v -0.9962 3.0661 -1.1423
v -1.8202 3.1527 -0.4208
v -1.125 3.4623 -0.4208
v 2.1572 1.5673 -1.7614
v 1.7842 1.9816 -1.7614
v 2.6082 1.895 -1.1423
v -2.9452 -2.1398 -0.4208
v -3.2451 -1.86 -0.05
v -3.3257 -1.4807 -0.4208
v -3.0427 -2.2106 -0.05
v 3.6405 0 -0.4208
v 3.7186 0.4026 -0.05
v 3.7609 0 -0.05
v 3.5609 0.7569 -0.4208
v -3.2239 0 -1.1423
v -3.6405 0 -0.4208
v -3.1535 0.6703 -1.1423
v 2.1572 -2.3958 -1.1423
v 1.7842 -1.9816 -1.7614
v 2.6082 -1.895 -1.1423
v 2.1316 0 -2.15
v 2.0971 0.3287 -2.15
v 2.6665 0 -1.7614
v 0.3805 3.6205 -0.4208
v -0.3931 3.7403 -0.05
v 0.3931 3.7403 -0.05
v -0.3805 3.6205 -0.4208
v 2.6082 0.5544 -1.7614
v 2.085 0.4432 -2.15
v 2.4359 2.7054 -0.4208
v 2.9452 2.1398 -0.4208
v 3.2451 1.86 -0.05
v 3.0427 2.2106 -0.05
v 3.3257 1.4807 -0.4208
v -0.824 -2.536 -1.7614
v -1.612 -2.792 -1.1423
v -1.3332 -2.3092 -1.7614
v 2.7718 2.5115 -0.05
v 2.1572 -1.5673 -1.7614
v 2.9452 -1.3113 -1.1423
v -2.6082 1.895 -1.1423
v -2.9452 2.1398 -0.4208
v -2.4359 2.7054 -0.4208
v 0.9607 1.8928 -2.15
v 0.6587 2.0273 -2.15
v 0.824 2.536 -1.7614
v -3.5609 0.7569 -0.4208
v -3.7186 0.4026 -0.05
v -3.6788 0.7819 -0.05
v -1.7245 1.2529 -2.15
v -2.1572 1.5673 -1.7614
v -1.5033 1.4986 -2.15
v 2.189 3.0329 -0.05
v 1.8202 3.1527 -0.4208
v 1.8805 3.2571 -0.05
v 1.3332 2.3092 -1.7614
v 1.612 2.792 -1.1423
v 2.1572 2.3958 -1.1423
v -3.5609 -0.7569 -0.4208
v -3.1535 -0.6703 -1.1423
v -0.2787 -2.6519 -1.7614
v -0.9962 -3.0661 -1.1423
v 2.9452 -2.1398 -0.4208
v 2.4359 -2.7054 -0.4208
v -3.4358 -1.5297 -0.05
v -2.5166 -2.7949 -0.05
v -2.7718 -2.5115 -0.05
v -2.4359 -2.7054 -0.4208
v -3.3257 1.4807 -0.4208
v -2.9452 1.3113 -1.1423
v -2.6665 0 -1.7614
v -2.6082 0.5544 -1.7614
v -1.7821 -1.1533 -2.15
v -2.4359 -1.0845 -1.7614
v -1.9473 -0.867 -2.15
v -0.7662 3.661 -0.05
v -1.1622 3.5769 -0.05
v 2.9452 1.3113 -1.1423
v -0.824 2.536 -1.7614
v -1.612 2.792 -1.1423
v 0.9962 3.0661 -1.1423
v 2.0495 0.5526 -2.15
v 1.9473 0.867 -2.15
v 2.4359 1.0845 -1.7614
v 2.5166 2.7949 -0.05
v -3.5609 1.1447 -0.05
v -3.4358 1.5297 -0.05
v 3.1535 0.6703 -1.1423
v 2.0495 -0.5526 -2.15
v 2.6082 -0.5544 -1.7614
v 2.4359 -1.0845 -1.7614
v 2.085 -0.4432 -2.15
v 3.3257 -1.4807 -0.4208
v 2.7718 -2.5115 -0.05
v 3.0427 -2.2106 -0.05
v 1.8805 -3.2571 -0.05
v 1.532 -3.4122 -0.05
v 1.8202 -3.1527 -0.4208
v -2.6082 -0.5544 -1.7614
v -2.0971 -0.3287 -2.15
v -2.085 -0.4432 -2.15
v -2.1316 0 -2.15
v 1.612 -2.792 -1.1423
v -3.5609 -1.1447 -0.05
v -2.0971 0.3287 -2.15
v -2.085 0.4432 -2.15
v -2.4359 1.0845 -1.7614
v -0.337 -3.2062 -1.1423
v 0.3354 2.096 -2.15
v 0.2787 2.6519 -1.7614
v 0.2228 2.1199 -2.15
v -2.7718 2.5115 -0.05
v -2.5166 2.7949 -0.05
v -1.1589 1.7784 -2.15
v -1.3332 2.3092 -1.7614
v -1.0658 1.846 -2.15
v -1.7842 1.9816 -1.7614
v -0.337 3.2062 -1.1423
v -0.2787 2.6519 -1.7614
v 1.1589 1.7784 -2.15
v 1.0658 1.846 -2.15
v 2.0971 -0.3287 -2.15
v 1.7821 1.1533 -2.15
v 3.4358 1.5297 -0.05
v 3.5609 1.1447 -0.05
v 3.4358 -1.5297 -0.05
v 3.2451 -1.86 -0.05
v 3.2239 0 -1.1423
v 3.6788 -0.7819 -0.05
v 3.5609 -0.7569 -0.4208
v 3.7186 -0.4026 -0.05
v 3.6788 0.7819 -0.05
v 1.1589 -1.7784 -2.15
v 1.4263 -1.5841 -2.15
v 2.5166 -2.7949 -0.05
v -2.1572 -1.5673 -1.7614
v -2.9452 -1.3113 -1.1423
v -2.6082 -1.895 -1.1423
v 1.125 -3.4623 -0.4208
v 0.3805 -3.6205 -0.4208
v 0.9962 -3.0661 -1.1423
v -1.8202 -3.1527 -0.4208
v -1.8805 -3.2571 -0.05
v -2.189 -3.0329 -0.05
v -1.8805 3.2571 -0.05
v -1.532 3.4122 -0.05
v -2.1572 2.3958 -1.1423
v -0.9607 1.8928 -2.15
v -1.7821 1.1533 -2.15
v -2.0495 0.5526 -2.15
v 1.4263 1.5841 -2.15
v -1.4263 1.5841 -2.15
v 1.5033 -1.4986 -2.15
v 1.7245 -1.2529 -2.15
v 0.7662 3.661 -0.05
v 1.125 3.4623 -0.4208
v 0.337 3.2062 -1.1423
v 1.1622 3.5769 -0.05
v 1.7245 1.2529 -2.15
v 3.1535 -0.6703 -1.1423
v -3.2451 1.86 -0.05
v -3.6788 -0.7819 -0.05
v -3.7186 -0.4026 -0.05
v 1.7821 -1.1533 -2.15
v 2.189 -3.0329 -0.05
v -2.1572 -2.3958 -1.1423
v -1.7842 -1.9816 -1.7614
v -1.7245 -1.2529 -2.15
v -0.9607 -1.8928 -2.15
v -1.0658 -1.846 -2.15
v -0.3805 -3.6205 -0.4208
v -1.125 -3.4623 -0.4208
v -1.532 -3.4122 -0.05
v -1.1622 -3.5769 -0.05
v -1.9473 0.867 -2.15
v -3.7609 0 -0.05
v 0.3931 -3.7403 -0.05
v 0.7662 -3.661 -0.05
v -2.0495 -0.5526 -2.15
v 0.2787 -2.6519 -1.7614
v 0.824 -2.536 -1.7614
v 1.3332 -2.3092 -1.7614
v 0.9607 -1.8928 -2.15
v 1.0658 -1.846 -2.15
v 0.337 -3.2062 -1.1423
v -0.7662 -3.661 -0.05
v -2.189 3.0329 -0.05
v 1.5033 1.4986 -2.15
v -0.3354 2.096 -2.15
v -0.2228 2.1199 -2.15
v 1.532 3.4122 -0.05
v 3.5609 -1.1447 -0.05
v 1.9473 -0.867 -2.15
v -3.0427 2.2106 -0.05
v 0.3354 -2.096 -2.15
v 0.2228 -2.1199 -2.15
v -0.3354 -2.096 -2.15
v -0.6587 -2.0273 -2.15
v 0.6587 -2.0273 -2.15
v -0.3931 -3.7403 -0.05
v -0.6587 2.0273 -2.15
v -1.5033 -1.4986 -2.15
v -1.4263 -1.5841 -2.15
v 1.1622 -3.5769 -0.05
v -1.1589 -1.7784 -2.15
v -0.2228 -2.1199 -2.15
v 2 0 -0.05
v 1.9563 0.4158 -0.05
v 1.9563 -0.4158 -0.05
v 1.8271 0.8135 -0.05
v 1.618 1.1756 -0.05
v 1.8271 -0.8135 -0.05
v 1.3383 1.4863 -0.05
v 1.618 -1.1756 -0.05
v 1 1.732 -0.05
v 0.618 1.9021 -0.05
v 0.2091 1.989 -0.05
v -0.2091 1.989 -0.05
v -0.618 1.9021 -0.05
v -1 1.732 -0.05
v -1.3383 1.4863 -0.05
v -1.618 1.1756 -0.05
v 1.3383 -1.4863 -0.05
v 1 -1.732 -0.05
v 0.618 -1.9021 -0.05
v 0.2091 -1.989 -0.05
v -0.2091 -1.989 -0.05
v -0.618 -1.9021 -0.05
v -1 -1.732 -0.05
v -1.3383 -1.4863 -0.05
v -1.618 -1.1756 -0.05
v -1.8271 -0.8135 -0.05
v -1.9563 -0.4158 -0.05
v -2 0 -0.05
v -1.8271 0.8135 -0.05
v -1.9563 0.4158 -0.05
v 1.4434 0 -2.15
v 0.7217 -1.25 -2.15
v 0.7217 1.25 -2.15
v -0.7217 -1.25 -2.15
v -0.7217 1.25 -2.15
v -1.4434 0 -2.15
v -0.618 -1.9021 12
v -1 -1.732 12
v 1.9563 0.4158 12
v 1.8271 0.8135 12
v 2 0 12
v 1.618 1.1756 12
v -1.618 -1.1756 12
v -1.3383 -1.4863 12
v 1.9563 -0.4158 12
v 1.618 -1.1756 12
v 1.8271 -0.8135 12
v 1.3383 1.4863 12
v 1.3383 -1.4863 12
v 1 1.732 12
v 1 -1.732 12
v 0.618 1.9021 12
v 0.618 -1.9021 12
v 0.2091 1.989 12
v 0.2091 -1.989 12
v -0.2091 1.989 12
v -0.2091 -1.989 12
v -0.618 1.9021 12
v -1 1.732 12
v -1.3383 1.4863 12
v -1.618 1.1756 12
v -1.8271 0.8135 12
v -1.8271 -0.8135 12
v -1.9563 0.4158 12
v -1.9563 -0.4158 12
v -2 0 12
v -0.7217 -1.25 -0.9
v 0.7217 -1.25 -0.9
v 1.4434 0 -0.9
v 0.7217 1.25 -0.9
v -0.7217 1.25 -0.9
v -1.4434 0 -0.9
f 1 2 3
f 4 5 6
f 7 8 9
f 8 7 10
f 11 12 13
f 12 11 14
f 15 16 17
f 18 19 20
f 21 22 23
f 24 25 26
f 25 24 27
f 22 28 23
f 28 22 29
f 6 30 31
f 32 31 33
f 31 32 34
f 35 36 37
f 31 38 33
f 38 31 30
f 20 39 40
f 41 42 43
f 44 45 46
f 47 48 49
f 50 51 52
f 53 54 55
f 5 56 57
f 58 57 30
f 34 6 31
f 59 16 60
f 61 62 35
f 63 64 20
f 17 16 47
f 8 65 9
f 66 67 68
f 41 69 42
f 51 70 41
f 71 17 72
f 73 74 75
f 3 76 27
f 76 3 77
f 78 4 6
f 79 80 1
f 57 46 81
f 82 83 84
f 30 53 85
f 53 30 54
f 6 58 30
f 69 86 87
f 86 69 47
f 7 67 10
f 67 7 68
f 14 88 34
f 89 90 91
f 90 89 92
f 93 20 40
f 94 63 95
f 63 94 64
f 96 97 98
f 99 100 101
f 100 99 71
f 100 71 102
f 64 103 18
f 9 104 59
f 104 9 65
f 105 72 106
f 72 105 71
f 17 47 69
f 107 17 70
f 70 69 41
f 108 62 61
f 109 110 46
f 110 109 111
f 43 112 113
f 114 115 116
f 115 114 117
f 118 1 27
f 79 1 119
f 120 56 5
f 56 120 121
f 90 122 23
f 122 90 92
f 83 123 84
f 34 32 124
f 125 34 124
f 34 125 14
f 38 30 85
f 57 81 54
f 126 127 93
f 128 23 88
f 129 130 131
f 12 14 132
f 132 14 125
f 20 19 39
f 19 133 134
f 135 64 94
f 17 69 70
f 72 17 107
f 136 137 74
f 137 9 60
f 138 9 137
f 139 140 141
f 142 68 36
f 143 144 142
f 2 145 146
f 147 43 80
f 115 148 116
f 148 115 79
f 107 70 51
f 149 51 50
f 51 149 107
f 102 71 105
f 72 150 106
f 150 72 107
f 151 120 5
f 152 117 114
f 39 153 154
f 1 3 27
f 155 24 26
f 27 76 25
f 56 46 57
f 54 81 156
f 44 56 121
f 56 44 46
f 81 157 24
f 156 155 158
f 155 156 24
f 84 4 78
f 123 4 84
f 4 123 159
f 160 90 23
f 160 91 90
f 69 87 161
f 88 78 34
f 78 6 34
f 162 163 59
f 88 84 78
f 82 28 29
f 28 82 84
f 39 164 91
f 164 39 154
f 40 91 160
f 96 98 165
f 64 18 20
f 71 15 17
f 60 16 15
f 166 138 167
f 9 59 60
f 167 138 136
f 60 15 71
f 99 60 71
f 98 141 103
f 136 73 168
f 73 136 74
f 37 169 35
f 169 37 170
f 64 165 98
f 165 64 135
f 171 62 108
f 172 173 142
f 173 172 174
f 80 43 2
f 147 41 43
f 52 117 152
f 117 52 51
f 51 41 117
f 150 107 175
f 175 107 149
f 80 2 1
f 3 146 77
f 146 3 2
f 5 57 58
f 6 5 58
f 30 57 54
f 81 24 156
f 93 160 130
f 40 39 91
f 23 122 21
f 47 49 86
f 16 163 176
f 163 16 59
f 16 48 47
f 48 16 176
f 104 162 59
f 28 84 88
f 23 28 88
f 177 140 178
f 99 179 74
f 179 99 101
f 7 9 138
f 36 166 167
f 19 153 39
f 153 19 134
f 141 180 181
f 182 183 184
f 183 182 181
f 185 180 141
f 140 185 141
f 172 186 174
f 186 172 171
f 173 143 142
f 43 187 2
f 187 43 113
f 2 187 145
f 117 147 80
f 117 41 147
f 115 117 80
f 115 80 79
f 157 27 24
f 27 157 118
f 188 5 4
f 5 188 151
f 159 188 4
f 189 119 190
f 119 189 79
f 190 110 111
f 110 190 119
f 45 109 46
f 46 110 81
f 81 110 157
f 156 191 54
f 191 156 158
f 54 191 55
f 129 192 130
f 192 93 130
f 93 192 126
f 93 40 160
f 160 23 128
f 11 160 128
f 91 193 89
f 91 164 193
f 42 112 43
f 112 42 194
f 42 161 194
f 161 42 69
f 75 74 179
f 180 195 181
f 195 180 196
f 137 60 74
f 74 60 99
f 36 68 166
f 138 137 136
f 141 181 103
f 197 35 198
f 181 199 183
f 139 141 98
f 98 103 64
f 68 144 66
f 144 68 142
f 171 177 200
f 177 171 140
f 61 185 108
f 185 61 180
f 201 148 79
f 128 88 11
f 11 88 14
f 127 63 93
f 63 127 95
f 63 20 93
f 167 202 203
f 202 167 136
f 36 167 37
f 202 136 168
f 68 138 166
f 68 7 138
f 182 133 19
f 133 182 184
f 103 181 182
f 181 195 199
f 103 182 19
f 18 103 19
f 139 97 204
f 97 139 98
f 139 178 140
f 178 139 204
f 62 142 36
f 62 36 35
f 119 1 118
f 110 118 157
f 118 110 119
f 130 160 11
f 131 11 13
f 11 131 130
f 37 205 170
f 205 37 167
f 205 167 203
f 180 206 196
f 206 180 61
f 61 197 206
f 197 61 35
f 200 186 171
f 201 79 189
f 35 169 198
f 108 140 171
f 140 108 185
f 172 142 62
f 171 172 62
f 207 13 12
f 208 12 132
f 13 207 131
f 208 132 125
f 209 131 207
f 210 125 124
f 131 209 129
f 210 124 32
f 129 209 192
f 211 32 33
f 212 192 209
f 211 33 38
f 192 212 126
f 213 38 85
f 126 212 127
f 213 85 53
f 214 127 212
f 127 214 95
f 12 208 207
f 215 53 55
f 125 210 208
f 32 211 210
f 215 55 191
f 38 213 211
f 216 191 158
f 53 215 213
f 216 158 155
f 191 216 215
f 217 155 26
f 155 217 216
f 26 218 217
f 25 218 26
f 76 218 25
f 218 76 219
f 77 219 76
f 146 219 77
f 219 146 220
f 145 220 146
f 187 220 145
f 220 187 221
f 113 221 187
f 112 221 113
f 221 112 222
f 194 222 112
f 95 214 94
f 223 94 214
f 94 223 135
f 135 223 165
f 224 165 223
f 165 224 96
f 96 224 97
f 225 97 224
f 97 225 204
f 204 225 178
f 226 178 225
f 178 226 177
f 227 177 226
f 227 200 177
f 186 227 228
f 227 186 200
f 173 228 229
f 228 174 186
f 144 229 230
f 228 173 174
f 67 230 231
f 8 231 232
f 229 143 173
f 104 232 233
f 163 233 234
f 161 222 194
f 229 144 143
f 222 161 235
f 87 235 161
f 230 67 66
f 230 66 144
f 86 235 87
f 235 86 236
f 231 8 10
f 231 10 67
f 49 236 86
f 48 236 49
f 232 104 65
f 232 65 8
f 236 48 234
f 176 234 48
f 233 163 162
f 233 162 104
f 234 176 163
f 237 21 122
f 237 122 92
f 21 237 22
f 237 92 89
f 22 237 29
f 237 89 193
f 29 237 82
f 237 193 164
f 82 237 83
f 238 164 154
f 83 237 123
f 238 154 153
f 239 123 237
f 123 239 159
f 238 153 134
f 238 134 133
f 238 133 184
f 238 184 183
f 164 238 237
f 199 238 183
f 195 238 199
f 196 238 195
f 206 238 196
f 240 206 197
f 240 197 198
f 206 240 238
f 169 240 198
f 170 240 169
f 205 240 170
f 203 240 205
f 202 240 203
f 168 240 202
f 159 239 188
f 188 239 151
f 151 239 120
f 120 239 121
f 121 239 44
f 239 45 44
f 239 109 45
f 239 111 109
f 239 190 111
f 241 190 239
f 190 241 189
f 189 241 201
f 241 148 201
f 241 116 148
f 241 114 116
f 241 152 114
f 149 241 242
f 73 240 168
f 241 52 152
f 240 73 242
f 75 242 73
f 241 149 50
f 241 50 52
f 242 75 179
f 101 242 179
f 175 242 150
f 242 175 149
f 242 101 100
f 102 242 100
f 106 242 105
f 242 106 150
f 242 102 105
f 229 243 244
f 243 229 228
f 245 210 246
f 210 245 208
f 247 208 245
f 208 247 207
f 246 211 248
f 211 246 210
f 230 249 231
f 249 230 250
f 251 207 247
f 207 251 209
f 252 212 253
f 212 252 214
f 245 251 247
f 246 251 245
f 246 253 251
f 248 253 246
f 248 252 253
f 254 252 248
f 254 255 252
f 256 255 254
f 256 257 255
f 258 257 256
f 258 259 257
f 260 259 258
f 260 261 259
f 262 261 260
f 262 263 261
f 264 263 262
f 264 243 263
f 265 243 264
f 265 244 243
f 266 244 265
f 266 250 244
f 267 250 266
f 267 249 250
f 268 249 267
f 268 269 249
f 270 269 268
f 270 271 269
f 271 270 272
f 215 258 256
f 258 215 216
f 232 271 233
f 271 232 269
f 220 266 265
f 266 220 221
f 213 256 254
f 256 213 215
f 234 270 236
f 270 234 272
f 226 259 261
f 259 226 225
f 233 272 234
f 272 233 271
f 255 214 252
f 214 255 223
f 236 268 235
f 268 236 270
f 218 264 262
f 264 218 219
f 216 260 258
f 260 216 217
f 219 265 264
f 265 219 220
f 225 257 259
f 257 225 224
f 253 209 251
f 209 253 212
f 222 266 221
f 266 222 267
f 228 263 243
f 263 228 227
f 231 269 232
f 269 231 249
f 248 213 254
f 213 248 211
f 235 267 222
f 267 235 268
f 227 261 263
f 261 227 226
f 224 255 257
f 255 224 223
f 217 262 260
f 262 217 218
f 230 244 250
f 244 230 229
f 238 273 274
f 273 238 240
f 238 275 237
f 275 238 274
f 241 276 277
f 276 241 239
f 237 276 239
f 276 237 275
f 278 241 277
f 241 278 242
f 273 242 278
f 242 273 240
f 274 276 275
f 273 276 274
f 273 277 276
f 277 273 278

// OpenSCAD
/*
   Copyright 2018 Scott Bezek and the splitflap contributors

   Licensed under the Apache License, Version 2.0 (the "License");
   you may not use this file except in compliance with the License.
   You may obtain a copy of the License at

       http://www.apache.org/licenses/LICENSE-2.0

   Unless required by applicable law or agreed to in writing, software
   distributed under the License is distributed on an "AS IS" BASIS,
   WITHOUT WARRANTIES OR CONDITIONS OF ANY KIND, either express or implied.
   See the License for the specific language governing permissions and
   limitations under the License.
*/

module roughM4_7380(length) {
    eps = 0.1;
    thread_diameter = 4;
    head_diameter = 7.6;
    head_length = 2.2;
    driving_depth = 1.3;
    driving_apothem = 2.5/2;
    driving_radius = driving_apothem / cos(180/6);

    sphere_offset = 1.2;  // Just a guess
    sphere_radius = sqrt(sphere_offset*sphere_offset + (head_diameter/2)*(head_diameter/2));


    difference() {
        union() {
            translate([0, 0, -eps]) {
                cylinder(h=length+eps, d=thread_diameter, $fn=30);
            }
            difference() {
                translate([0, 0, sphere_offset]) {
                    sphere(sphere_radius, $fn=30);
                }
                translate([0, 0, sphere_radius]) {
                    cube([sphere_radius*2 + eps, sphere_radius*2 + eps, sphere_radius*2 + eps], center=true);
                }
                translate([0, 0, -sphere_radius - head_length]) {
                    cube([sphere_radius*2 + eps, sphere_radius*2 + eps, sphere_radius*2 + eps], center=true);
                }
            }
        }
        translate([0, 0, -head_length-eps]) {
            cylinder(h=driving_depth+eps, r=driving_radius, $fn=6);
        }
    }
}

roughM4_7380(12);

        module color_selector(c) {
            precision = 0.0000001;  // arbitrary
            function compare_floats(x, y, i=0) = 
                  (len(x) != len(y)) ? false  // if arrays differ in length, they can't be equal
                : (i >= len(x)) ? true  // if we've hit the end of the arrays without issue, we're equal
                : (x[i] - precision <= y[i]) && x[i] + precision >= y[i]
                    ? compare_floats(x, y, i+1)
                    : false;  // not equal, short circuit

            if (c == [0.75, 0.75, 0.8] || compare_floats(c, [0.75, 0.75, 0.8]))
                children();
        }
                    
